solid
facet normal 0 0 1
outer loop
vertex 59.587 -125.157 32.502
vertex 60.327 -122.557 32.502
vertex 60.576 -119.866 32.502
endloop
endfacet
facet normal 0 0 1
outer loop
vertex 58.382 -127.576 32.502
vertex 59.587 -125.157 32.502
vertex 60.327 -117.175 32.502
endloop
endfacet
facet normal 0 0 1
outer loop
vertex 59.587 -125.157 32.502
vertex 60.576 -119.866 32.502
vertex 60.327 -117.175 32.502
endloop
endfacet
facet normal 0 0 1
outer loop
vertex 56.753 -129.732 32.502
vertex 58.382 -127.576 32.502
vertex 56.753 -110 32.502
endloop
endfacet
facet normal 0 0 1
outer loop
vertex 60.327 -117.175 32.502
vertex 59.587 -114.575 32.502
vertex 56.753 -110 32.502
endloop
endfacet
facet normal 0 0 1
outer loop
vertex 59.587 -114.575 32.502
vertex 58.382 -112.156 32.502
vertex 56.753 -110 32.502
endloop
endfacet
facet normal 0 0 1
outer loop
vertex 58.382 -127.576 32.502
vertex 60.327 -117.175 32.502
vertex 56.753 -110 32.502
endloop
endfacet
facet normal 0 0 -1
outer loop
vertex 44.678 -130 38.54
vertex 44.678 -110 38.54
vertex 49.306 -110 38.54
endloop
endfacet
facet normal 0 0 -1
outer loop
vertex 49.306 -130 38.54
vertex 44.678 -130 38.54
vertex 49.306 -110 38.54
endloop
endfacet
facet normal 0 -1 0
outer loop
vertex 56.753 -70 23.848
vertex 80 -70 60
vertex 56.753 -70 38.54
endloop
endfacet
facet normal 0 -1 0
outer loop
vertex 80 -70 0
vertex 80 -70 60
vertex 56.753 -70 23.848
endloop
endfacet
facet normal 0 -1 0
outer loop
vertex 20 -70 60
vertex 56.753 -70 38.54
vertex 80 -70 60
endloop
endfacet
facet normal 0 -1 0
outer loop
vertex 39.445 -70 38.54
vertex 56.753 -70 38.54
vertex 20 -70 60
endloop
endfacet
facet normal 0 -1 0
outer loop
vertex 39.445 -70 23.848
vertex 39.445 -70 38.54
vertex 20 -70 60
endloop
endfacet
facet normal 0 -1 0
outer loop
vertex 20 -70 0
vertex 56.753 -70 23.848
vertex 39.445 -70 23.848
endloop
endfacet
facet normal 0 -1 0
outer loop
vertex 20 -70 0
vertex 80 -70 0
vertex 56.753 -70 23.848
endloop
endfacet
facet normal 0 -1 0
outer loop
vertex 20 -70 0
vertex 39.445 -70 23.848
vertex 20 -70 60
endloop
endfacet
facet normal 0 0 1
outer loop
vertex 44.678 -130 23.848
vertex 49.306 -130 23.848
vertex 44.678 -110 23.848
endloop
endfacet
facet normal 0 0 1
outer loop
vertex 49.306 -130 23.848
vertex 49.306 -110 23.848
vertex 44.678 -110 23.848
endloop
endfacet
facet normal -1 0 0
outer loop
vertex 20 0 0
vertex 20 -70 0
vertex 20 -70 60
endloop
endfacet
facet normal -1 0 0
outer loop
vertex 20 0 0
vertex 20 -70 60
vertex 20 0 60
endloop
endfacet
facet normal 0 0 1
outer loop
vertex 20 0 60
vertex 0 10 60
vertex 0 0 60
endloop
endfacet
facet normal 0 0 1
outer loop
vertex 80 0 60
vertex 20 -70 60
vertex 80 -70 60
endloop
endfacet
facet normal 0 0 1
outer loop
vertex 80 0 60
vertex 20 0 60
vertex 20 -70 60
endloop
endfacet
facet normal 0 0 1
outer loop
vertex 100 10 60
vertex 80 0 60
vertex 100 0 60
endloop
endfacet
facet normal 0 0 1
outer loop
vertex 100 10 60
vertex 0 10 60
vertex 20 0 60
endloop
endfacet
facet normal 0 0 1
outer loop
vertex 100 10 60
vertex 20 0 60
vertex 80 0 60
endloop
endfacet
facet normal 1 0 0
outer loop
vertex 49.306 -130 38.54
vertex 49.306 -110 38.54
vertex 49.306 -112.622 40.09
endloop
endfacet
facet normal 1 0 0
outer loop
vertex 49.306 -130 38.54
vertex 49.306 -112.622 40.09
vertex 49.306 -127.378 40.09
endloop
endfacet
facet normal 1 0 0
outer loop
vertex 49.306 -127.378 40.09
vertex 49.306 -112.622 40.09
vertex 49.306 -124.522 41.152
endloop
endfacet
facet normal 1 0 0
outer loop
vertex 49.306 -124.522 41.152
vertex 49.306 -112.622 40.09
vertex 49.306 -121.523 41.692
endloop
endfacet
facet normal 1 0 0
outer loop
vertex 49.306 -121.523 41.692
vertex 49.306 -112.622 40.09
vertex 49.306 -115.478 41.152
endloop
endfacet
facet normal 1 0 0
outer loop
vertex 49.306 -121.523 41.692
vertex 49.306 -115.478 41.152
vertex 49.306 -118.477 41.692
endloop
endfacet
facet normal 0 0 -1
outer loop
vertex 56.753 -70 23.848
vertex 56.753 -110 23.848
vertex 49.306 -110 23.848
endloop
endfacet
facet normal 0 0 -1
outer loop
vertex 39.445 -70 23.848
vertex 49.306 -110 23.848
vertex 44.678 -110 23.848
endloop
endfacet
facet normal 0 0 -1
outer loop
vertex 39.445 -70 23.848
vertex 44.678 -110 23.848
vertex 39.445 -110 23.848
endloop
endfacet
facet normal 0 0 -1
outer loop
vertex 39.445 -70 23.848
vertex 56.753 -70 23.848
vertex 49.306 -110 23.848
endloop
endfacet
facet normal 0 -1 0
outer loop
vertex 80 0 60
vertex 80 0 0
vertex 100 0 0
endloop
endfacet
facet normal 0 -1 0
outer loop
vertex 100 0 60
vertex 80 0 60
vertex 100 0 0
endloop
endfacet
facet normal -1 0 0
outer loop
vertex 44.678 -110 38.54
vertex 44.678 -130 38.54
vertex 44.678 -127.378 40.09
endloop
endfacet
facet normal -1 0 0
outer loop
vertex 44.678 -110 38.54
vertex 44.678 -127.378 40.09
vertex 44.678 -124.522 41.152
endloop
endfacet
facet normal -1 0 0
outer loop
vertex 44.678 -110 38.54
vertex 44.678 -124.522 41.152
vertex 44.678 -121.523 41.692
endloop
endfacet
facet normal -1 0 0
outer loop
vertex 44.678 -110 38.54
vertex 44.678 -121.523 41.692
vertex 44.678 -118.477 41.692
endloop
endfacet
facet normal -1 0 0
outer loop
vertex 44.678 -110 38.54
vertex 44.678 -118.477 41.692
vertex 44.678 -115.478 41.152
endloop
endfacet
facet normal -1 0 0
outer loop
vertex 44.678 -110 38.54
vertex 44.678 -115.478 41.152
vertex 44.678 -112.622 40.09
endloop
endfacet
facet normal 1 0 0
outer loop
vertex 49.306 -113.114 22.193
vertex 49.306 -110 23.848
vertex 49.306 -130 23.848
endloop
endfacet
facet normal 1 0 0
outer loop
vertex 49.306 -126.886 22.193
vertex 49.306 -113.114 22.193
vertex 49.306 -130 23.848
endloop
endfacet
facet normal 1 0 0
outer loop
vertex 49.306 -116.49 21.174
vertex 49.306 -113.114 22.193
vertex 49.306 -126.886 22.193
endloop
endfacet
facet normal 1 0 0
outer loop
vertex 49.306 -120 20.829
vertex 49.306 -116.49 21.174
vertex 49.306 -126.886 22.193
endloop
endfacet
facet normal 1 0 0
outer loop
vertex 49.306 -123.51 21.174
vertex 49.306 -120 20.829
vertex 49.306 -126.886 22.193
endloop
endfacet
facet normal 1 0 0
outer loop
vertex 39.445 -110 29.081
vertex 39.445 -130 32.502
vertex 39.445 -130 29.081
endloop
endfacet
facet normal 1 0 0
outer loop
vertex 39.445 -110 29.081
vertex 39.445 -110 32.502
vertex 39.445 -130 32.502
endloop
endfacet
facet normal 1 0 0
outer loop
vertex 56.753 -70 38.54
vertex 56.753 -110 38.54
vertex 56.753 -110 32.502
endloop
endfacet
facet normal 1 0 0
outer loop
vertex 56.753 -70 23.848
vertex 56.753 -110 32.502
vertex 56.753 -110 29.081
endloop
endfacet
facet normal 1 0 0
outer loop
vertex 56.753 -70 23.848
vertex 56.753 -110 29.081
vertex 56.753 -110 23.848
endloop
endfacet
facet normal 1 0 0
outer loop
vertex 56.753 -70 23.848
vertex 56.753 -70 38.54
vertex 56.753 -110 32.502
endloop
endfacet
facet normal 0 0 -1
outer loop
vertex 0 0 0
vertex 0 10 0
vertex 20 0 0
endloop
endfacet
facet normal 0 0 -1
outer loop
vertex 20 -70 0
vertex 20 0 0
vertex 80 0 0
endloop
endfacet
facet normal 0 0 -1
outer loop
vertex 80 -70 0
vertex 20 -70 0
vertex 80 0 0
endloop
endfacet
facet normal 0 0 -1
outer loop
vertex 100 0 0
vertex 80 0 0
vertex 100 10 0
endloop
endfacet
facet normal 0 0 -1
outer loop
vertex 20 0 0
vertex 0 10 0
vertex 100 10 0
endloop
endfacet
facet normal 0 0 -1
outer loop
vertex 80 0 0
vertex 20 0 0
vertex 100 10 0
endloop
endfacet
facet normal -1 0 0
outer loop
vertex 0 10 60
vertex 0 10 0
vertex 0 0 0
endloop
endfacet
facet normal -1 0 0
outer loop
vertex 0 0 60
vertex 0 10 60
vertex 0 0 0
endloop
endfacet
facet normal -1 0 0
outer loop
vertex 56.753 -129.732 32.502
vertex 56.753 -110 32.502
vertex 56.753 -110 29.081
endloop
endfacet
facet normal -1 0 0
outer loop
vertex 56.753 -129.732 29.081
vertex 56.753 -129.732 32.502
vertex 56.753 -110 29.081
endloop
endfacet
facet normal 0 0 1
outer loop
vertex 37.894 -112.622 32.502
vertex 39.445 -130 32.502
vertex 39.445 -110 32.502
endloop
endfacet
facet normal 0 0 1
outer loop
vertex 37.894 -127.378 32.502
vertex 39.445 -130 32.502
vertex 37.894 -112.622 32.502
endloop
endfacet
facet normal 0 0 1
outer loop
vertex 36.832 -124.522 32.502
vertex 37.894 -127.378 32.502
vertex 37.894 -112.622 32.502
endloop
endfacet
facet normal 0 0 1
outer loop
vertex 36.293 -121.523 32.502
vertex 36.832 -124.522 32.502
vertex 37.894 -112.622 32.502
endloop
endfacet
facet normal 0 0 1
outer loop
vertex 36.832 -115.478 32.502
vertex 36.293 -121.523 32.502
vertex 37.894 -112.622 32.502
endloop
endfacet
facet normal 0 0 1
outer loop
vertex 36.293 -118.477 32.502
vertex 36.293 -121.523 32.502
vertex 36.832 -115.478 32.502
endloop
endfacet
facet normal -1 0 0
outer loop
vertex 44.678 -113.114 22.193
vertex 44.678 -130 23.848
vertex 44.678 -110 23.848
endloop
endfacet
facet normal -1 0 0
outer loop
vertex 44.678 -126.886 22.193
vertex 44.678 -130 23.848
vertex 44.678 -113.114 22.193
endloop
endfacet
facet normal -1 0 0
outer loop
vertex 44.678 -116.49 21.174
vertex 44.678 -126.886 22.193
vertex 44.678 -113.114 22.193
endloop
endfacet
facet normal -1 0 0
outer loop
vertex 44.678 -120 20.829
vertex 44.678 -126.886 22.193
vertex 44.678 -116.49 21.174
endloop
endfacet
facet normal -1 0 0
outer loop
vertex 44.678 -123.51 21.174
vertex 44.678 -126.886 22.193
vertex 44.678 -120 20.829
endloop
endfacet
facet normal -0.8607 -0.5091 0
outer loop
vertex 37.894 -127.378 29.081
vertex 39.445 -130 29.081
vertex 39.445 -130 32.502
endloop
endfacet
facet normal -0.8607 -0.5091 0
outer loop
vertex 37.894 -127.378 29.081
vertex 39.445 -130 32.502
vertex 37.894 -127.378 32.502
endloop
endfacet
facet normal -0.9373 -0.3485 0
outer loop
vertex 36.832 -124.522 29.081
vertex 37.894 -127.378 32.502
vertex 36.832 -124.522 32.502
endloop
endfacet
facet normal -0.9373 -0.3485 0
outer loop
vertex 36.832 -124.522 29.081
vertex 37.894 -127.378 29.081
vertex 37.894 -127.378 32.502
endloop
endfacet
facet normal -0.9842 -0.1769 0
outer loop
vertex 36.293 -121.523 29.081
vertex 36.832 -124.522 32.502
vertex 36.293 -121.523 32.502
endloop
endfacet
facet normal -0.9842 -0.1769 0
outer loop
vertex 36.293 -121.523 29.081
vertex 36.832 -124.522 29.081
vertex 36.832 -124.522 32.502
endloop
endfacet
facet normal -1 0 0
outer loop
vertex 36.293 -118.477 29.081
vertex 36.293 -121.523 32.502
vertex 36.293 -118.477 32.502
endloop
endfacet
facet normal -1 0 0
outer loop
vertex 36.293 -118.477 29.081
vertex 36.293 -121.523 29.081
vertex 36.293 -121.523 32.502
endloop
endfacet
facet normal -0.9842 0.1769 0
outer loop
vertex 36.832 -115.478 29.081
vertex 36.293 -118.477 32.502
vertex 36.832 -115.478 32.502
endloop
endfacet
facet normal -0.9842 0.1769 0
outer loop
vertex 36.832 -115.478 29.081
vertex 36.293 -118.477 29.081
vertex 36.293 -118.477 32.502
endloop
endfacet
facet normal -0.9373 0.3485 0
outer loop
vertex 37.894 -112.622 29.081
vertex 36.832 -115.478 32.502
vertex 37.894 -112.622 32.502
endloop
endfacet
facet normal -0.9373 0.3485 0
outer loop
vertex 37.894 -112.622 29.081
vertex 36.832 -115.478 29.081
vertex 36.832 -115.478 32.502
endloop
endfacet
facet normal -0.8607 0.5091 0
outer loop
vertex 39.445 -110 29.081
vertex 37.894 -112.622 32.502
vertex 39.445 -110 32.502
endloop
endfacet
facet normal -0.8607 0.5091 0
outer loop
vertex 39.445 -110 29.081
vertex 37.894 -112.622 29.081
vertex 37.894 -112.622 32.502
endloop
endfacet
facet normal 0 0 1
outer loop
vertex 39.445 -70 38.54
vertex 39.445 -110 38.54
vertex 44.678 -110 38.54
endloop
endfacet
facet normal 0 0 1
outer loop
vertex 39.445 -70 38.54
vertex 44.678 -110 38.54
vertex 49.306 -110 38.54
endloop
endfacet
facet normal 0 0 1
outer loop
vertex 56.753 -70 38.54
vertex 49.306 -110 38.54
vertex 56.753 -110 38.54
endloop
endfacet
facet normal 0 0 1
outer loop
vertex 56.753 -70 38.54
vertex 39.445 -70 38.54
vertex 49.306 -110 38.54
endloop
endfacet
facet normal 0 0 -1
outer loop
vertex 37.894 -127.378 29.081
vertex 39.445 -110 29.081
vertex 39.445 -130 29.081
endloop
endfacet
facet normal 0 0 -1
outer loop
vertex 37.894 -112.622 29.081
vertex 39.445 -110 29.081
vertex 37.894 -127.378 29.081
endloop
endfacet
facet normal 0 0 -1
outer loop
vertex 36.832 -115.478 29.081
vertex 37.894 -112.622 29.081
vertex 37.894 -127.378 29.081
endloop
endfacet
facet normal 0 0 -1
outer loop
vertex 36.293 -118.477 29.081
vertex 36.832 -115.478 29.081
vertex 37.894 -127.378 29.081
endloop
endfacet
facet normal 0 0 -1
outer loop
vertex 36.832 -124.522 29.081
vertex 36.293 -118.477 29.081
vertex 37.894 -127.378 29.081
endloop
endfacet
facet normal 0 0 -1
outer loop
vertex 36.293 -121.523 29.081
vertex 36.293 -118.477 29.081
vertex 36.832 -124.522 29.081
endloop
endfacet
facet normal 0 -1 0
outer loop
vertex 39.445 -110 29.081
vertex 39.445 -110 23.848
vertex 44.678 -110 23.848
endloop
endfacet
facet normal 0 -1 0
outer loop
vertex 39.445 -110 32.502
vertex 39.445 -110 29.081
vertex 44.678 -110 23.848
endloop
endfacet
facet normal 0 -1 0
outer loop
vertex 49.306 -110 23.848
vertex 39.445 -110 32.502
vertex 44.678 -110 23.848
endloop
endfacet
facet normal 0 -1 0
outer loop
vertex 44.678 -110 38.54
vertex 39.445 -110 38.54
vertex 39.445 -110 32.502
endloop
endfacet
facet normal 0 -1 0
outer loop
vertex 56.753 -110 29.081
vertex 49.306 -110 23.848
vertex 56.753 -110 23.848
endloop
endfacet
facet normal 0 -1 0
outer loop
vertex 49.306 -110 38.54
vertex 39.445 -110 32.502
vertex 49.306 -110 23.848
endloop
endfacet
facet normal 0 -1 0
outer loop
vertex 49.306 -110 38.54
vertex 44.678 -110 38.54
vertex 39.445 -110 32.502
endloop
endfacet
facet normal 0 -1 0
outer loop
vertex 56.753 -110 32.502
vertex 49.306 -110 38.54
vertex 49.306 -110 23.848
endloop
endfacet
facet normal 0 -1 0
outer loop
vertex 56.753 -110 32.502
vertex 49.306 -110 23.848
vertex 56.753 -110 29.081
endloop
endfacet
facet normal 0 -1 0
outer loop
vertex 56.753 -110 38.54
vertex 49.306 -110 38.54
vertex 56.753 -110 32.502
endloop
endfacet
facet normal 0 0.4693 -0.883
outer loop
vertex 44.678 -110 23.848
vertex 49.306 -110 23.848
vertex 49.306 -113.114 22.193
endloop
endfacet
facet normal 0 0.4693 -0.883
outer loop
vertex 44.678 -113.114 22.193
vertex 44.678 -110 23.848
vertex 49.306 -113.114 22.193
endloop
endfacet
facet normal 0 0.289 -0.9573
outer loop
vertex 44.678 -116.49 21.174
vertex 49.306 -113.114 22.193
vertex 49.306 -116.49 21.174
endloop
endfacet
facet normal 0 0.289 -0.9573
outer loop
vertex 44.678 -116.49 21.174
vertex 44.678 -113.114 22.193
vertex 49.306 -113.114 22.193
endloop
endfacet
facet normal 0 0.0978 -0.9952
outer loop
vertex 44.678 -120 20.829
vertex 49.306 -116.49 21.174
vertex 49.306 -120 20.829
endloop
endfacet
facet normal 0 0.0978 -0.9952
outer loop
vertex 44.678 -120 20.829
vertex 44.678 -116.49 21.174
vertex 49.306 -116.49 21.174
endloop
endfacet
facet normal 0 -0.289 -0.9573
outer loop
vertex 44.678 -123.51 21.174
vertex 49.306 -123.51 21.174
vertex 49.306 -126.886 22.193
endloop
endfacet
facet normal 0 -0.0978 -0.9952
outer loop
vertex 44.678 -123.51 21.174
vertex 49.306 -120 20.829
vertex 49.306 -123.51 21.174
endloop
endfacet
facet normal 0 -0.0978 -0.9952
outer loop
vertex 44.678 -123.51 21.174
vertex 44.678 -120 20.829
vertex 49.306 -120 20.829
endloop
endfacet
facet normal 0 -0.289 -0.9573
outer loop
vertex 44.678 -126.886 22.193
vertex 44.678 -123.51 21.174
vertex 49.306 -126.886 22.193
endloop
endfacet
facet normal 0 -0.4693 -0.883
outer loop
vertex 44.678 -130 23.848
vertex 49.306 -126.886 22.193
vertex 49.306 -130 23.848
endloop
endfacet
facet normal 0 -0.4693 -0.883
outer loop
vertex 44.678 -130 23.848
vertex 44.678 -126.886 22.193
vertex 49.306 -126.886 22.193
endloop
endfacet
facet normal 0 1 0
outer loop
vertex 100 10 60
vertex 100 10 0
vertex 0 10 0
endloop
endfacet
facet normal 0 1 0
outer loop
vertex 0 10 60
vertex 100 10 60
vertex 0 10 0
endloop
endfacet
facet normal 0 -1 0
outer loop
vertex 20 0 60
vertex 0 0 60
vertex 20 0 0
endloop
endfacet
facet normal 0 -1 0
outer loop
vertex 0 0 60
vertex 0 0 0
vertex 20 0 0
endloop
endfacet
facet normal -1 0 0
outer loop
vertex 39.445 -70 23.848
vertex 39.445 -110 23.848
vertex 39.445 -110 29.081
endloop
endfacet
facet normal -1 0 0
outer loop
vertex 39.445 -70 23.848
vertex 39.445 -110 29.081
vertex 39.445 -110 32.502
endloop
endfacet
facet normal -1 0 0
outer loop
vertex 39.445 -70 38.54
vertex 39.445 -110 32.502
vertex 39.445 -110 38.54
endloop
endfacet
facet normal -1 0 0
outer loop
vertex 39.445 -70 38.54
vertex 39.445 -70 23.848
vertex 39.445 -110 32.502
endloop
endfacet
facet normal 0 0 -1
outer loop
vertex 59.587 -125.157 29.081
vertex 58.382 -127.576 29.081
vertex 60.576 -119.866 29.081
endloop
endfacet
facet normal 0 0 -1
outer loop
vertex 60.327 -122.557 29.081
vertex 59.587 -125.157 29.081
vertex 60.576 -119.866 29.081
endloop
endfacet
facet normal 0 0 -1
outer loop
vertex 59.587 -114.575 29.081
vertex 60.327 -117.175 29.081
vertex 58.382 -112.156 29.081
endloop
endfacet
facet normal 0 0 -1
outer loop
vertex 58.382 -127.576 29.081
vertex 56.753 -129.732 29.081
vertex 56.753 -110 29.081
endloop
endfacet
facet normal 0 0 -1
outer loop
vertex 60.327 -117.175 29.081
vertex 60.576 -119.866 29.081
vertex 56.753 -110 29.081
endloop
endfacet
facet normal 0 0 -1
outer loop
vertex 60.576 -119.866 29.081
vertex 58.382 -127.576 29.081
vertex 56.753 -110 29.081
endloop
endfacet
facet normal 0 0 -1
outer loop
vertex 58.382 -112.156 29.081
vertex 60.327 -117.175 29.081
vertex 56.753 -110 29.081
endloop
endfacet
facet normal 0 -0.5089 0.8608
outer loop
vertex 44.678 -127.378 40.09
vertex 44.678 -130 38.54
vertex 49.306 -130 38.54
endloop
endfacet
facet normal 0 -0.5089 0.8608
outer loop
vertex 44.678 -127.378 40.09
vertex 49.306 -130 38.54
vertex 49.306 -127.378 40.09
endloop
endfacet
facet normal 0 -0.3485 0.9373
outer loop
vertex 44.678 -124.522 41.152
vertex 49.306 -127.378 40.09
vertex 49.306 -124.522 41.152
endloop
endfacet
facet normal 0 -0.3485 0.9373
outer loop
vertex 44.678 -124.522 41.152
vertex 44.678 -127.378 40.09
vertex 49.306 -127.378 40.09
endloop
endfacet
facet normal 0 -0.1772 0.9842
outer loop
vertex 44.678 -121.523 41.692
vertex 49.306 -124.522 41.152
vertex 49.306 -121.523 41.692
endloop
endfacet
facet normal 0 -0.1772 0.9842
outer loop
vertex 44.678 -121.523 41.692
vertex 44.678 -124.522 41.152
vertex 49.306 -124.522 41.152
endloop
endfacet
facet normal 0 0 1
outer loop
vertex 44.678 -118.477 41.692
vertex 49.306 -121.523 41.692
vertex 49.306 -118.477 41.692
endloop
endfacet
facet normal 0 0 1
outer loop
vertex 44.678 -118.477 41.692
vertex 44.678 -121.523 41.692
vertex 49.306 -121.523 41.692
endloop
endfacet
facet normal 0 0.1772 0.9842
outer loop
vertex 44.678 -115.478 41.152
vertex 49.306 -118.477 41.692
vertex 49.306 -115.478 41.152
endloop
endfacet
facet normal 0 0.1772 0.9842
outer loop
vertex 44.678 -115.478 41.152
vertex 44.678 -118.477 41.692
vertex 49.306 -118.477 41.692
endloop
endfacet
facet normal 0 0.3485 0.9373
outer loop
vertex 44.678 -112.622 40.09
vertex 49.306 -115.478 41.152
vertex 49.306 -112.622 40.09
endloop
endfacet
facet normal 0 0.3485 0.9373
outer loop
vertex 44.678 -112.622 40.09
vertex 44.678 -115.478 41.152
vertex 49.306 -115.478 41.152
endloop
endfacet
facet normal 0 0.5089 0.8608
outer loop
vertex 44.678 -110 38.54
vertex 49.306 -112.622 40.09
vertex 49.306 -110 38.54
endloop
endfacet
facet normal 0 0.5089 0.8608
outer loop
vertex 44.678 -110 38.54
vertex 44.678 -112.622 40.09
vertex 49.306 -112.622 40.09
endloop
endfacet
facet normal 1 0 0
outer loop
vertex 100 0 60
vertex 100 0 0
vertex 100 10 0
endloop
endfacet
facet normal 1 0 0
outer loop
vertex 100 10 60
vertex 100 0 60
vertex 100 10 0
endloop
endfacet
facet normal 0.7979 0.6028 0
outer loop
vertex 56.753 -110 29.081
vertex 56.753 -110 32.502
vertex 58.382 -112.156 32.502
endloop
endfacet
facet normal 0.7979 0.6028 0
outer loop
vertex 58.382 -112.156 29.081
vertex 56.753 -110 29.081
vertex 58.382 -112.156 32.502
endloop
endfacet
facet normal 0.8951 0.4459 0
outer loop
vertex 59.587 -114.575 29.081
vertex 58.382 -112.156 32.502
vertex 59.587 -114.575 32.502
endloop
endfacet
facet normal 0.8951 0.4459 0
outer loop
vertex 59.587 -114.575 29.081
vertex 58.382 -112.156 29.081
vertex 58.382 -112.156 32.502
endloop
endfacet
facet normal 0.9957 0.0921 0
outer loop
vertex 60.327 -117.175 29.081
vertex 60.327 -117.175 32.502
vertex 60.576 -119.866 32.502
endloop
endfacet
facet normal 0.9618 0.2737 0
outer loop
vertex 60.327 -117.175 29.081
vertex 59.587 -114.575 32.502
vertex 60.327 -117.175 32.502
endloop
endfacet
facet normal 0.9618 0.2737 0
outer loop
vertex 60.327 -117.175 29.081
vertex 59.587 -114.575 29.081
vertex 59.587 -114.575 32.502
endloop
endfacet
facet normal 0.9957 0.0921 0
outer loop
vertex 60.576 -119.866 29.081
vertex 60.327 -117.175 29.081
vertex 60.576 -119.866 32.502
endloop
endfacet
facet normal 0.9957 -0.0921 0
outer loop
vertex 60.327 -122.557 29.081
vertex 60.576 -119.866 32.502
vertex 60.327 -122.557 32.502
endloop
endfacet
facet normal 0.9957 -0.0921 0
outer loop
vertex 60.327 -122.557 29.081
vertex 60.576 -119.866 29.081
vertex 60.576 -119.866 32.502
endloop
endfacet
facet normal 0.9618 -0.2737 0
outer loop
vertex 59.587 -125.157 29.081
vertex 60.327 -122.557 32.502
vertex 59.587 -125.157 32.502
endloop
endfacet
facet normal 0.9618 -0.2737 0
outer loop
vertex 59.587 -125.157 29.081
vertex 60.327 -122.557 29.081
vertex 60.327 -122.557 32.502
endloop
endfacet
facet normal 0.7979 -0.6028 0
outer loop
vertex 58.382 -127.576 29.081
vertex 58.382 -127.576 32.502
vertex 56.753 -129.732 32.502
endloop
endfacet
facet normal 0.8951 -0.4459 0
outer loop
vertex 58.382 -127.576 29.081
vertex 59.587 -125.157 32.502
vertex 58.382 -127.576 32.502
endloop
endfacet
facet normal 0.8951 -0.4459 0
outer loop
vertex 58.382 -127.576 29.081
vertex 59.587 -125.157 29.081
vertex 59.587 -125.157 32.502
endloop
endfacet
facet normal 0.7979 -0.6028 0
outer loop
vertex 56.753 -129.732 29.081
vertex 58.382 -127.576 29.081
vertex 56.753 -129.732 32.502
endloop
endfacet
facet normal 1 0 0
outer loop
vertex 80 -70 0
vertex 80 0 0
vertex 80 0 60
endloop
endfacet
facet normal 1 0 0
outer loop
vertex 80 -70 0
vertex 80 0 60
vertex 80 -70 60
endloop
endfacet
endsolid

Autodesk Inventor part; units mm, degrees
ref_plane "YZ Plane" through (0, 0, 0) normal (1, 0, 0) x (0, 1, 0)
ref_plane "XZ Plane" through (0, 0, 0) normal (0, 1, 0) x (-1, 0, 0)
ref_plane "XY Plane" through (0, 0, 0) normal (0, 0, 1) x (1, 0, 0)
sketch "Sketch1" plane through (0, 0, 0) normal (0, 0, 1) x (1, 0, 0)
  line L0 (0, 0) -> (100, 0)
  line L1 (100, 0) -> (100, 10)
  line L2 (100, 10) -> (0, 10)
  line L3 (0, 10) -> (0, 0)
  line L4 (20, 0) -> (80, 0)
  line L5 (80, 0) -> (80, -70)
  line L6 (80, -70) -> (20, -70)
  line L7 (20, -70) -> (20, 0)
  dimension "d0" = 100
  dimension "d1" = 10
  dimension "d2" = 60
  dimension "d3" = 70
extrude "Extrusion1" add sketch "Sketch1" along normal blind 60
sketch "Sketch3" plane through (20, -70, 0) normal (0, -1, 0) x (1, 0, 0)
  line L0 (36.7526, 23.8482) -> (19.4451, 23.8482)
  line L1 (19.4451, 23.8482) -> (19.4451, 38.5395)
  line L2 (19.4451, 38.5395) -> (36.7526, 38.5395)
  line L3 (36.7526, 38.5395) -> (36.7526, 23.8482)
  point P0 (-20, 0)
extrude "Extrusion2" add sketch "Sketch3" along normal blind 40
sketch "Sketch4" plane through (20, -110, 0) normal (0, -1, 0) x (1, 0, 0)
  line L0 (36.7526, 38.5395) -> (36.7526, 23.8482) projected
  line L1 (36.7526, 29.0807) -> (40.5764, 29.0807)
  line L2 (40.5764, 29.0807) -> (40.5764, 32.502)
  line L3 (40.5764, 32.502) -> (36.7526, 32.502)
  line L4 (36.7526, 32.502) -> (36.7526, 29.0807)
  line L5 (19.4451, 38.5395) -> (19.4451, 23.8482) projected
  line L6 (19.4451, 32.502) -> (16.2251, 32.502)
  line L7 (16.2251, 32.502) -> (16.2251, 29.0807)
  line L8 (16.2251, 29.0807) -> (19.4451, 29.0807)
  line L9 (19.4451, 29.0807) -> (19.4451, 32.502)
  line L10 (19.4451, 38.5395) -> (36.7526, 38.5395) projected
  line L11 (29.3064, 38.5395) -> (24.6776, 38.5395)
  line L12 (24.6776, 38.5395) -> (24.6776, 41.7595)
  line L13 (24.6776, 41.7595) -> (29.3064, 41.7595)
  line L14 (29.3064, 41.7595) -> (29.3064, 38.5395)
  line L15 (36.7526, 23.8482) -> (19.4451, 23.8482) projected
  line L16 (29.3064, 23.8482) -> (24.6776, 23.8482)
  line L17 (24.6776, 23.8482) -> (24.6776, 20.8294)
  line L18 (24.6776, 20.8294) -> (29.3064, 20.8294)
  line L19 (29.3064, 20.8294) -> (29.3064, 23.8482)
  point P0 (-20, 0)
extrude "Extrusion3" add sketch "Sketch4" along normal blind 20 contours L3 L2 L1 L0 | L10 L12 L13 L14 | L19 L18 L17 L15 | L5 L8 L7 L6
sketch "Sketch9" plane through (60.5764, -110, 29.0807) normal (0, 0, -1) x (-1, 0, 0)
  line L0 (3.8238, 0) -> (3.8238, -20) projected
  arc A0 (3.8238, 0) -> (3.8238, -19.7321) centre (14.64, -9.866) ccw
  line L1 (3.8238, 0) -> (0, 0) projected
  line L2 (3.8238, 0) -> (0, 0)
  line L3 (0, 0) -> (0, -9.866)
  line L4 (0, 0) -> (0, -20) projected
  line L5 (3.8238, -20) -> (0, -20) projected
  line L6 (0, -20) -> (3.8238, -20) projected
  line L7 (0, -20) -> (3.8238, -20)
  point P0 (60.5764, 110)
extrude "Extrusion4" cut sketch "Sketch9" against normal blind 20 contours A0 L3 L1 | L0 L5 L4 A0
sketch "Sketch10" plane through (39.4451, -110, 29.0807) normal (0, 0, -1) x (-1, 0, 0)
  line L0 (0, -20) -> (3.22, -20) projected
  line L1 (0, 0) -> (0, -20) projected
  arc A0 (0, -20) -> (0, 0) centre (-13.9179, -10) ccw
  line L2 (0, 0) -> (3.22, 0)
  line L3 (3.22, 0) -> (3.22, -10)
  line L4 (3.22, 0) -> (3.22, -20) projected
  point P0 (39.4451, 110)
extrude "Extrusion5" cut sketch "Sketch10" against normal blind 20 contours A0 L4 L0 | L2 L3 A0
sketch "Sketch11" plane through (44.6776, -110, 20.8294) normal (-1, 0, 0) x (0, 0, 1)
  line L0 (3.0188, 0) -> (3.0188, -20) projected
  arc A0 (3.0188, 0) -> (3.0188, -20) centre (18.0725, -10) ccw
  line L1 (3.0188, 0) -> (0, 0) projected
  line L2 (3.0188, 0) -> (0, 0)
  line L3 (0, 0) -> (0, -10)
  line L4 (0, 0) -> (0, -20) projected
  line L5 (0, -20) -> (3.0188, -20) projected
  line L6 (0, -20) -> (3.0188, -20)
  point P0 (-20.8294, 110)
extrude "Extrusion6" cut sketch "Sketch11" against normal blind 20 contours A0 L3 L1 | L5 L4 A0
sketch "Sketch12" plane through (44.6776, -110, 38.5395) normal (-1, 0, 0) x (0, 0, 1)
  line L0 (0, 0) -> (0, -20) projected
  arc A0 (0, -20) -> (0, 0) centre (-13.9179, -10) ccw
  line L1 (-6.0375, 0) -> (0, 0) projected
  line L2 (0, 0) -> (3.22, 0) projected
  line L3 (0, 0) -> (3.22, 0)
  line L4 (3.22, 0) -> (3.22, -10)
  line L5 (3.22, 0) -> (3.22, -20) projected
  line L6 (0, -20) -> (3.22, -20) projected
  line L7 (3.22, -20) -> (0, -20)
  point P0 (-38.5395, 110)
extrude "Extrusion7" cut sketch "Sketch12" against normal blind 20 contours L2 L4 A0 | A0 L5 L6
properties part number "robotarm"
